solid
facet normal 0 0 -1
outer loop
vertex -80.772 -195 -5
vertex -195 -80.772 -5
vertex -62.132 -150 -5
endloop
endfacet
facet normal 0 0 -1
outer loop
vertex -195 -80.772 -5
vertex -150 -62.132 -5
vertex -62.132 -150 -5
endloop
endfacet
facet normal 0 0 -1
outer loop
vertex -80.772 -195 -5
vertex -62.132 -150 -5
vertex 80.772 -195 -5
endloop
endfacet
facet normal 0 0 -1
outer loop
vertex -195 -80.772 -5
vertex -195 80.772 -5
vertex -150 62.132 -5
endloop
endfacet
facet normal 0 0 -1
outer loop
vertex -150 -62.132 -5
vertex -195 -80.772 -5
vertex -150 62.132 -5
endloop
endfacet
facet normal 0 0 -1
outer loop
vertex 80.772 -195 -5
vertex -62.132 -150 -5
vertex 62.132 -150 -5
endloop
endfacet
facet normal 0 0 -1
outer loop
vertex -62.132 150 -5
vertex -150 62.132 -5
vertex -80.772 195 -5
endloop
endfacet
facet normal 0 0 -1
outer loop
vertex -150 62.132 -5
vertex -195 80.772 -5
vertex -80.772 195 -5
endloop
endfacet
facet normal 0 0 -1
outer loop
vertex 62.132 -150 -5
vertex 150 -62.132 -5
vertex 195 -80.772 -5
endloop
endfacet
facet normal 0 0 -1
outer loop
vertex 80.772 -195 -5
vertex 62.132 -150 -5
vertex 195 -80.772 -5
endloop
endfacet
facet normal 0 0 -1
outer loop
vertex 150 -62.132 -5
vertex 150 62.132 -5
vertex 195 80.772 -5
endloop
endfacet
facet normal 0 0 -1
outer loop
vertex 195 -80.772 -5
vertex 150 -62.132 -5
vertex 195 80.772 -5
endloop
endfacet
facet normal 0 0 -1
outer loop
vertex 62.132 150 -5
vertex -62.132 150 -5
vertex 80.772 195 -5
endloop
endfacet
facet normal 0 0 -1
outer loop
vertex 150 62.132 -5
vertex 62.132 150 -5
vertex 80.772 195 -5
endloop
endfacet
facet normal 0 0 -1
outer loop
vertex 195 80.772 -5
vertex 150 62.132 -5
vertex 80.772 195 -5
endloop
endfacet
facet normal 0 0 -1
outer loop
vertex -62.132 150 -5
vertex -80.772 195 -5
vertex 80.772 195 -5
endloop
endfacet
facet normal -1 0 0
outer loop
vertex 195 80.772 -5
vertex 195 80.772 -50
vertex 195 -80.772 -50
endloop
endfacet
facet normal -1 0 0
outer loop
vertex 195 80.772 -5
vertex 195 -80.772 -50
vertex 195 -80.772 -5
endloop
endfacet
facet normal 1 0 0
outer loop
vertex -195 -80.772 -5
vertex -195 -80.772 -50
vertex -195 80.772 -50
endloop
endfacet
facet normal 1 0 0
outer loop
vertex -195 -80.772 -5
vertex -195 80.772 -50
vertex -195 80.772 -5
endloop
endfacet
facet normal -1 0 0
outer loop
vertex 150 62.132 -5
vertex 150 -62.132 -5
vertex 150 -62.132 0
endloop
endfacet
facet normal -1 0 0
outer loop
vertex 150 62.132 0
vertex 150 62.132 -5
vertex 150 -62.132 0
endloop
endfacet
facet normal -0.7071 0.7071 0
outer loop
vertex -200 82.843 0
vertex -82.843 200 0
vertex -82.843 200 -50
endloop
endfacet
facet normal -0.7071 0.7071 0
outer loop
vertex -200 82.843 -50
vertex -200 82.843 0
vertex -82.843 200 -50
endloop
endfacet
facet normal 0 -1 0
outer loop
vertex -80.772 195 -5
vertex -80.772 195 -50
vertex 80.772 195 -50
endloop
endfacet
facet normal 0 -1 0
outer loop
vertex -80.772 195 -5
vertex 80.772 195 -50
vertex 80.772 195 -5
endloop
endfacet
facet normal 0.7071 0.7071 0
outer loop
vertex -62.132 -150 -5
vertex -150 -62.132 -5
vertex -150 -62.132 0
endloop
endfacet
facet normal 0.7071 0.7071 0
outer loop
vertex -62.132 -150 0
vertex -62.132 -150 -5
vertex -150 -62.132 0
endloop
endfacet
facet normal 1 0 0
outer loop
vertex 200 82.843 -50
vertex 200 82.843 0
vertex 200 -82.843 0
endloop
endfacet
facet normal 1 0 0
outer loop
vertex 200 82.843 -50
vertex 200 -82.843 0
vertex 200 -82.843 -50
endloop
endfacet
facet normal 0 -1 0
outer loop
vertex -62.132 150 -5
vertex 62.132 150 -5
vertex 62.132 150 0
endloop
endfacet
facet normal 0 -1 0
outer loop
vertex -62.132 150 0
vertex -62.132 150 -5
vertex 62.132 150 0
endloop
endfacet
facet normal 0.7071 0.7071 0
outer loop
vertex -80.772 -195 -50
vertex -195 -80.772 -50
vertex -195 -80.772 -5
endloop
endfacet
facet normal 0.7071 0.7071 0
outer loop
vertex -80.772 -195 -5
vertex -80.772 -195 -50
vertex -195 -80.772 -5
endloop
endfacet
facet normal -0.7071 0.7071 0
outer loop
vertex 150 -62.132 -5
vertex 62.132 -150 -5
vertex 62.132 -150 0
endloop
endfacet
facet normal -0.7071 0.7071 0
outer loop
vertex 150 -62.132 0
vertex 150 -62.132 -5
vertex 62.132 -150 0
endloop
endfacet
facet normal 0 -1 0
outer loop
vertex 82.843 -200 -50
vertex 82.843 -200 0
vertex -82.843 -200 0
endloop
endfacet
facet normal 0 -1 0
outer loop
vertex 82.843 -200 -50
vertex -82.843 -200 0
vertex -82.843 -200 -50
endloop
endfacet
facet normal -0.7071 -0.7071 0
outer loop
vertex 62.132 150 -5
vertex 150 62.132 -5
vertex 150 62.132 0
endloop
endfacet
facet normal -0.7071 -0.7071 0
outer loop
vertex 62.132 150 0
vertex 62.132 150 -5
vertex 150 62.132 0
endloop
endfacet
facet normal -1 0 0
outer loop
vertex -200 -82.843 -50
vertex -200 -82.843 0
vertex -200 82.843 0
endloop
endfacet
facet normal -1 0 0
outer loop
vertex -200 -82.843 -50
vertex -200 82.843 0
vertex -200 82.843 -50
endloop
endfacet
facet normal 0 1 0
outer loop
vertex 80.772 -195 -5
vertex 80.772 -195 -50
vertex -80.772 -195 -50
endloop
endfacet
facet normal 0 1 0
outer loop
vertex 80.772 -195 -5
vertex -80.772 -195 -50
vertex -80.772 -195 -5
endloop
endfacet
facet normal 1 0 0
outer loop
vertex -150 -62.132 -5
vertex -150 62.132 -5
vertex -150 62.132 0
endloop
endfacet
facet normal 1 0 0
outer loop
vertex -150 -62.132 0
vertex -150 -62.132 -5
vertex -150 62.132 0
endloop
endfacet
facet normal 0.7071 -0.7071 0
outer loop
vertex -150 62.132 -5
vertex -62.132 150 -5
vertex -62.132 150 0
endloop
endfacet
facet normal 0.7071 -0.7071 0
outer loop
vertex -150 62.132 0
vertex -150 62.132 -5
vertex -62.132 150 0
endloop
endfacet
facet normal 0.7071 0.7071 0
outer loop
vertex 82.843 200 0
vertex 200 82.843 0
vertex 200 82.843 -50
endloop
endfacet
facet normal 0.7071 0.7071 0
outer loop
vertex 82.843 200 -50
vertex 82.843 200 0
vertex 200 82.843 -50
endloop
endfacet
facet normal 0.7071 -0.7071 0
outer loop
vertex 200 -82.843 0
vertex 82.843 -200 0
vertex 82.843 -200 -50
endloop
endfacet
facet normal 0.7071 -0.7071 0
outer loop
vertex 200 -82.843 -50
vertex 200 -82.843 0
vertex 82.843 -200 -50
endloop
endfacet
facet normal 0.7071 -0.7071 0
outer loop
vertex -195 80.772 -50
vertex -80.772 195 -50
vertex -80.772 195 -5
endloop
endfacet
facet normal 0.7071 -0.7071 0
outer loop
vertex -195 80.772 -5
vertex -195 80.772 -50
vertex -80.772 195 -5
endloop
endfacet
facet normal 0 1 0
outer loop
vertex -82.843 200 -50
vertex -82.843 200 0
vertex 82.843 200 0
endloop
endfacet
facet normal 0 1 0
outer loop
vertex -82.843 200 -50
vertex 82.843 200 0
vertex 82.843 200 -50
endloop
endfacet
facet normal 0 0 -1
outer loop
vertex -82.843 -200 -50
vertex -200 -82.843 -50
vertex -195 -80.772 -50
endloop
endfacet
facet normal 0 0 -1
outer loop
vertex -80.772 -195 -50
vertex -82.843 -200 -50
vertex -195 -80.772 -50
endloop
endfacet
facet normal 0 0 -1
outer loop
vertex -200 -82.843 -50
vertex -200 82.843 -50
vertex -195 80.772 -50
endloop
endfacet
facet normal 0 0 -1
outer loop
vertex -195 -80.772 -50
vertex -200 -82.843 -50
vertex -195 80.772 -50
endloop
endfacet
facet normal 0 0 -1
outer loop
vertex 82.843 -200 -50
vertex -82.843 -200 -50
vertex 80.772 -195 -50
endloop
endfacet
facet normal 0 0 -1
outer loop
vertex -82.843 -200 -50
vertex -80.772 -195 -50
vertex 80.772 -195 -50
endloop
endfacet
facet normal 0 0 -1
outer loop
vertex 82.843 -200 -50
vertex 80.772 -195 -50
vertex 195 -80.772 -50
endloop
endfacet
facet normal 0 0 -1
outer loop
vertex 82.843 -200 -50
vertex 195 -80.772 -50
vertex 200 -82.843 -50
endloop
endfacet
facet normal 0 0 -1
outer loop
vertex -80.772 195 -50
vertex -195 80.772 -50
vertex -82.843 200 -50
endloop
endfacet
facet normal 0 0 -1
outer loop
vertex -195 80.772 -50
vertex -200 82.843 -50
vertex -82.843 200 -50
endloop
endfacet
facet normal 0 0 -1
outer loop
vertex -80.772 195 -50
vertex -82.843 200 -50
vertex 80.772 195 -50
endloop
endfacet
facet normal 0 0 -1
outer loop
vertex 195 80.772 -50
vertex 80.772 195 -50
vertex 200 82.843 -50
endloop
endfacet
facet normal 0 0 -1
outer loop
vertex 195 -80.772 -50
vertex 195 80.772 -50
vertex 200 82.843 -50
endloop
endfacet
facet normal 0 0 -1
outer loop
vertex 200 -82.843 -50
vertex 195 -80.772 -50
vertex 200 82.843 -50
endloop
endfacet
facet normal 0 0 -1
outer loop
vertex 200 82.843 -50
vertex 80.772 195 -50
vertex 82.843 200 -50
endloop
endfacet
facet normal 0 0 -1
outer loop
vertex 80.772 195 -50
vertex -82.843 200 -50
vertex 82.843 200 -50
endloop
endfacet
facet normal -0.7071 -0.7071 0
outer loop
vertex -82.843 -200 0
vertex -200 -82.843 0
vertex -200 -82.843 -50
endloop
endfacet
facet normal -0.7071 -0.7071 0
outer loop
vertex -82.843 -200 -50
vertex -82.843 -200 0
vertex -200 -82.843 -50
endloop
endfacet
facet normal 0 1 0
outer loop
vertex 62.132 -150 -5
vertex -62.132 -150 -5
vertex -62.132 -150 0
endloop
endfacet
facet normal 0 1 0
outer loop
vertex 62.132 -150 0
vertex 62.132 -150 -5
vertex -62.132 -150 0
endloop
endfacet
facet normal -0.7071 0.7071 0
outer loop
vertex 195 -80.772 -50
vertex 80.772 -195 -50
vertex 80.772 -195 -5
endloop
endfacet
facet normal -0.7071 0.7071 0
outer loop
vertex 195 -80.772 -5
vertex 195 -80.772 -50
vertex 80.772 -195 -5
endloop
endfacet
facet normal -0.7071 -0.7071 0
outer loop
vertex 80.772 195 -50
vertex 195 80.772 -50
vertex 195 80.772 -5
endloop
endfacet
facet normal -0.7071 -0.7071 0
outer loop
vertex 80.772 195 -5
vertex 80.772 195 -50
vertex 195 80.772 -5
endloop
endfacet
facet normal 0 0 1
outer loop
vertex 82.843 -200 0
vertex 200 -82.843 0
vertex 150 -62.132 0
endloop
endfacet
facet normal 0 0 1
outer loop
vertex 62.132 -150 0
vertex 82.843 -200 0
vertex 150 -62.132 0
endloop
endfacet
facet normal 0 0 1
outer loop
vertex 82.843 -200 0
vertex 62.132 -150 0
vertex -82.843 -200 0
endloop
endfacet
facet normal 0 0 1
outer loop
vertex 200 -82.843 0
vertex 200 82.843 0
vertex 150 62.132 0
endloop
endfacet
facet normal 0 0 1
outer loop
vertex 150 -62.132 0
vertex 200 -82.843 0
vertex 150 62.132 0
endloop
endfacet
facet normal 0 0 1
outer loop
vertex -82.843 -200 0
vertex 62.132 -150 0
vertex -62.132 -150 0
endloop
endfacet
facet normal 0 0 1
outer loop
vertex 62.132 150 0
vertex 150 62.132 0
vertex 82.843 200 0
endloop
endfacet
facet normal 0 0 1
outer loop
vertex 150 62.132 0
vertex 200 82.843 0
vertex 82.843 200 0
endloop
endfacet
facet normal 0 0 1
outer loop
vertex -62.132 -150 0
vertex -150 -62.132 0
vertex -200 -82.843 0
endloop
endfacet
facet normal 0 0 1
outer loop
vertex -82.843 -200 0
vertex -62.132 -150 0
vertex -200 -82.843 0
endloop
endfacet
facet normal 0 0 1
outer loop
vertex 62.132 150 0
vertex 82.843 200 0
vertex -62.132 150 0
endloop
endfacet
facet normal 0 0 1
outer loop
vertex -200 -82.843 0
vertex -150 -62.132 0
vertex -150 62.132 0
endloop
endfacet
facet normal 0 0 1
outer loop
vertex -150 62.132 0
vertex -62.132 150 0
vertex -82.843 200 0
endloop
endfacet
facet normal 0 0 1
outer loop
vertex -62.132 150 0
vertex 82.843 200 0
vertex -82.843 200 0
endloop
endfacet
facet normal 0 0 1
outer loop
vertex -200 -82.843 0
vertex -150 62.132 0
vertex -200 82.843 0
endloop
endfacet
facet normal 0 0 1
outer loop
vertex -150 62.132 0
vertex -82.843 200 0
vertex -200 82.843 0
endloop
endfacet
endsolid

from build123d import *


with BuildPart() as f2:
    # F2: sweep along a path in F0
    with BuildLine(Plane.XY) as f2_path:
        Line((-200, -82.8427124746), (-200, 82.8427124746))
        Line((-200, 82.8427124746), (-82.8427124746, 200))
        Line((-82.8427124746, 200), (82.8427124746, 200))
        Line((82.8427124746, 200), (200, 82.8427124746))
        Line((200, 82.8427124746), (200, -82.8427124746))
        Line((200, -82.8427124746), (82.8427124746, -200))
        Line((82.8427124746, -200), (-82.8427124746, -200))
        Line((-82.8427124746, -200), (-200, -82.8427124746))
    # F1 (on Front) → F2 (sweep)
    with BuildSketch(Plane.XZ):
        Polygon((-150, 0), (-200, 0), (-200, -50), (-195, -50), (-195, -5), (-150, -5), align=None)
    sweep(path=f2_path.line, transition=Transition.RIGHT)


solid = f2.part
